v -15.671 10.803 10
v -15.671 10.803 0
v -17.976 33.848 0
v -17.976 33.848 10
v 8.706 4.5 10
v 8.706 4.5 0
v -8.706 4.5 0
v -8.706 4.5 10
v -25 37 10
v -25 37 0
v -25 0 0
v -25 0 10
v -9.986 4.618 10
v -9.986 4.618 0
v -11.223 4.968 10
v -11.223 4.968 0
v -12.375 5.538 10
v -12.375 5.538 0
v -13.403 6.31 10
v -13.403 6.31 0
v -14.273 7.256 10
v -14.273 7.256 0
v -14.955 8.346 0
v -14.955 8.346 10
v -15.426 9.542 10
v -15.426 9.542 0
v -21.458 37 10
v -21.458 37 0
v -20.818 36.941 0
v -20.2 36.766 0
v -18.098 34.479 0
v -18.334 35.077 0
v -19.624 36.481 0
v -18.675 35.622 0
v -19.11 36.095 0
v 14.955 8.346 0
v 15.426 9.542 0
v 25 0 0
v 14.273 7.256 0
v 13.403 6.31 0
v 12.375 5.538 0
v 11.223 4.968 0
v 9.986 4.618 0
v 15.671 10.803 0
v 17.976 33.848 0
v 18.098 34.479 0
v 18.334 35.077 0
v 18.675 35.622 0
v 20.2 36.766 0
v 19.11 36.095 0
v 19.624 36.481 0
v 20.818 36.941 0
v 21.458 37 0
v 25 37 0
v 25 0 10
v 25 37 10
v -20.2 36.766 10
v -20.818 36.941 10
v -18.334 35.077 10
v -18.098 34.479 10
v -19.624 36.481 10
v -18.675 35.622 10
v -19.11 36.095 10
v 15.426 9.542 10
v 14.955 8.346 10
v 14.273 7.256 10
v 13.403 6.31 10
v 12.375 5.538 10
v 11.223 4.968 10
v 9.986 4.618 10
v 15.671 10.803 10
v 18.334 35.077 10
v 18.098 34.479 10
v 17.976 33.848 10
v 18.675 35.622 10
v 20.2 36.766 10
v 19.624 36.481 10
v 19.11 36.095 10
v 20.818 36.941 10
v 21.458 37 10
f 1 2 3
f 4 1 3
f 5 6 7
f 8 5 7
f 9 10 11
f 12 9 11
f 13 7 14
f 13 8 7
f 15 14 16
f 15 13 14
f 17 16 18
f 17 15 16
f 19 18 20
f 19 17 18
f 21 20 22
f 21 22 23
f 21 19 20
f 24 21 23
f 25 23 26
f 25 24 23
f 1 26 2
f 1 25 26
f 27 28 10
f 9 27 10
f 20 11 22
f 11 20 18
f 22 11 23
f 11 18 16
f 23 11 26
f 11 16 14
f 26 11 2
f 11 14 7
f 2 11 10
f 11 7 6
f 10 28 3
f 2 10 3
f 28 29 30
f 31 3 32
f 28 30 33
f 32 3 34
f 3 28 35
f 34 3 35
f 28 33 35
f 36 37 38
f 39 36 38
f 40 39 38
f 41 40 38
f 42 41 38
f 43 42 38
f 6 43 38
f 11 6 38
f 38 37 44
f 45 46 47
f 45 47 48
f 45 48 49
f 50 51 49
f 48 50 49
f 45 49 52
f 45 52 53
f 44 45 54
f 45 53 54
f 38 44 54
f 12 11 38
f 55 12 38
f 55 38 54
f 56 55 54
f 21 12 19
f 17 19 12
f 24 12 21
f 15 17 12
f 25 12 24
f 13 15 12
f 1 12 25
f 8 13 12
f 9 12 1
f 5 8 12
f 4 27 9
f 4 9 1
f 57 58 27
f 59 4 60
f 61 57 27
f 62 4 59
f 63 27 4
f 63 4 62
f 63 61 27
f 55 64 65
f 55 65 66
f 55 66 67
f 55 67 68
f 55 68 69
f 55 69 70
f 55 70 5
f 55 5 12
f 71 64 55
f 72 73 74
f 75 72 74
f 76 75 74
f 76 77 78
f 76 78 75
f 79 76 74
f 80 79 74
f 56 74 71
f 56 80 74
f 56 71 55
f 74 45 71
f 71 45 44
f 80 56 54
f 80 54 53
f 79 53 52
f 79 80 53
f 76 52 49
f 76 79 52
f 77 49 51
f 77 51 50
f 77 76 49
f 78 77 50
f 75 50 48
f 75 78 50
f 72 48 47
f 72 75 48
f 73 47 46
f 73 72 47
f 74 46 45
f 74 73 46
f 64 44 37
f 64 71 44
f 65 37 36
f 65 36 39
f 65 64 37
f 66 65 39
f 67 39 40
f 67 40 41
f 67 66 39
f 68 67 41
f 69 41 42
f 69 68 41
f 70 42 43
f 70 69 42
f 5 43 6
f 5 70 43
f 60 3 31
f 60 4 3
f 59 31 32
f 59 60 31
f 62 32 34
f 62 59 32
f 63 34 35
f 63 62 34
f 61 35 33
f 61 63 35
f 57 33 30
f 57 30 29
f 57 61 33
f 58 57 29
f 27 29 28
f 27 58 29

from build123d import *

# Parameters (mm, degrees)
EXTRUDE_1_DEPTH = 10
FILLET_1_R      = 3.5
FILLET_2_R      = 7


with BuildPart() as part:
    # 草图1 → 凸台-拉伸1 (new body)
    with BuildSketch(Plane(origin=(0, 0, 0), x_dir=(-1, 0, 0), z_dir=(0, 0, -1))):
        Polygon((25, 0), (-25, 0), (-25, 37), (-18.290755601, 37), (-15.040755601, 4.5), (15.040755601, 4.5), (18.290755601, 37), (25, 37), align=None)
    extrude(amount=-EXTRUDE_1_DEPTH)

    # 圆角1
    fillet_1_edges = [part.edges().sort_by_distance(p)[0] for p in [
        (-18.290755601, 37, 5),
        (18.290755601, 37, 5),
    ]]
    fillet(fillet_1_edges, radius=FILLET_1_R)

    # 圆角2
    fillet_2_edges = [part.edges().sort_by_distance(p)[0] for p in [
        (-15.040755601, 4.5, 5),
        (15.040755601, 4.5, 5),
    ]]
    fillet(fillet_2_edges, radius=FILLET_2_R)


solid = part.part
